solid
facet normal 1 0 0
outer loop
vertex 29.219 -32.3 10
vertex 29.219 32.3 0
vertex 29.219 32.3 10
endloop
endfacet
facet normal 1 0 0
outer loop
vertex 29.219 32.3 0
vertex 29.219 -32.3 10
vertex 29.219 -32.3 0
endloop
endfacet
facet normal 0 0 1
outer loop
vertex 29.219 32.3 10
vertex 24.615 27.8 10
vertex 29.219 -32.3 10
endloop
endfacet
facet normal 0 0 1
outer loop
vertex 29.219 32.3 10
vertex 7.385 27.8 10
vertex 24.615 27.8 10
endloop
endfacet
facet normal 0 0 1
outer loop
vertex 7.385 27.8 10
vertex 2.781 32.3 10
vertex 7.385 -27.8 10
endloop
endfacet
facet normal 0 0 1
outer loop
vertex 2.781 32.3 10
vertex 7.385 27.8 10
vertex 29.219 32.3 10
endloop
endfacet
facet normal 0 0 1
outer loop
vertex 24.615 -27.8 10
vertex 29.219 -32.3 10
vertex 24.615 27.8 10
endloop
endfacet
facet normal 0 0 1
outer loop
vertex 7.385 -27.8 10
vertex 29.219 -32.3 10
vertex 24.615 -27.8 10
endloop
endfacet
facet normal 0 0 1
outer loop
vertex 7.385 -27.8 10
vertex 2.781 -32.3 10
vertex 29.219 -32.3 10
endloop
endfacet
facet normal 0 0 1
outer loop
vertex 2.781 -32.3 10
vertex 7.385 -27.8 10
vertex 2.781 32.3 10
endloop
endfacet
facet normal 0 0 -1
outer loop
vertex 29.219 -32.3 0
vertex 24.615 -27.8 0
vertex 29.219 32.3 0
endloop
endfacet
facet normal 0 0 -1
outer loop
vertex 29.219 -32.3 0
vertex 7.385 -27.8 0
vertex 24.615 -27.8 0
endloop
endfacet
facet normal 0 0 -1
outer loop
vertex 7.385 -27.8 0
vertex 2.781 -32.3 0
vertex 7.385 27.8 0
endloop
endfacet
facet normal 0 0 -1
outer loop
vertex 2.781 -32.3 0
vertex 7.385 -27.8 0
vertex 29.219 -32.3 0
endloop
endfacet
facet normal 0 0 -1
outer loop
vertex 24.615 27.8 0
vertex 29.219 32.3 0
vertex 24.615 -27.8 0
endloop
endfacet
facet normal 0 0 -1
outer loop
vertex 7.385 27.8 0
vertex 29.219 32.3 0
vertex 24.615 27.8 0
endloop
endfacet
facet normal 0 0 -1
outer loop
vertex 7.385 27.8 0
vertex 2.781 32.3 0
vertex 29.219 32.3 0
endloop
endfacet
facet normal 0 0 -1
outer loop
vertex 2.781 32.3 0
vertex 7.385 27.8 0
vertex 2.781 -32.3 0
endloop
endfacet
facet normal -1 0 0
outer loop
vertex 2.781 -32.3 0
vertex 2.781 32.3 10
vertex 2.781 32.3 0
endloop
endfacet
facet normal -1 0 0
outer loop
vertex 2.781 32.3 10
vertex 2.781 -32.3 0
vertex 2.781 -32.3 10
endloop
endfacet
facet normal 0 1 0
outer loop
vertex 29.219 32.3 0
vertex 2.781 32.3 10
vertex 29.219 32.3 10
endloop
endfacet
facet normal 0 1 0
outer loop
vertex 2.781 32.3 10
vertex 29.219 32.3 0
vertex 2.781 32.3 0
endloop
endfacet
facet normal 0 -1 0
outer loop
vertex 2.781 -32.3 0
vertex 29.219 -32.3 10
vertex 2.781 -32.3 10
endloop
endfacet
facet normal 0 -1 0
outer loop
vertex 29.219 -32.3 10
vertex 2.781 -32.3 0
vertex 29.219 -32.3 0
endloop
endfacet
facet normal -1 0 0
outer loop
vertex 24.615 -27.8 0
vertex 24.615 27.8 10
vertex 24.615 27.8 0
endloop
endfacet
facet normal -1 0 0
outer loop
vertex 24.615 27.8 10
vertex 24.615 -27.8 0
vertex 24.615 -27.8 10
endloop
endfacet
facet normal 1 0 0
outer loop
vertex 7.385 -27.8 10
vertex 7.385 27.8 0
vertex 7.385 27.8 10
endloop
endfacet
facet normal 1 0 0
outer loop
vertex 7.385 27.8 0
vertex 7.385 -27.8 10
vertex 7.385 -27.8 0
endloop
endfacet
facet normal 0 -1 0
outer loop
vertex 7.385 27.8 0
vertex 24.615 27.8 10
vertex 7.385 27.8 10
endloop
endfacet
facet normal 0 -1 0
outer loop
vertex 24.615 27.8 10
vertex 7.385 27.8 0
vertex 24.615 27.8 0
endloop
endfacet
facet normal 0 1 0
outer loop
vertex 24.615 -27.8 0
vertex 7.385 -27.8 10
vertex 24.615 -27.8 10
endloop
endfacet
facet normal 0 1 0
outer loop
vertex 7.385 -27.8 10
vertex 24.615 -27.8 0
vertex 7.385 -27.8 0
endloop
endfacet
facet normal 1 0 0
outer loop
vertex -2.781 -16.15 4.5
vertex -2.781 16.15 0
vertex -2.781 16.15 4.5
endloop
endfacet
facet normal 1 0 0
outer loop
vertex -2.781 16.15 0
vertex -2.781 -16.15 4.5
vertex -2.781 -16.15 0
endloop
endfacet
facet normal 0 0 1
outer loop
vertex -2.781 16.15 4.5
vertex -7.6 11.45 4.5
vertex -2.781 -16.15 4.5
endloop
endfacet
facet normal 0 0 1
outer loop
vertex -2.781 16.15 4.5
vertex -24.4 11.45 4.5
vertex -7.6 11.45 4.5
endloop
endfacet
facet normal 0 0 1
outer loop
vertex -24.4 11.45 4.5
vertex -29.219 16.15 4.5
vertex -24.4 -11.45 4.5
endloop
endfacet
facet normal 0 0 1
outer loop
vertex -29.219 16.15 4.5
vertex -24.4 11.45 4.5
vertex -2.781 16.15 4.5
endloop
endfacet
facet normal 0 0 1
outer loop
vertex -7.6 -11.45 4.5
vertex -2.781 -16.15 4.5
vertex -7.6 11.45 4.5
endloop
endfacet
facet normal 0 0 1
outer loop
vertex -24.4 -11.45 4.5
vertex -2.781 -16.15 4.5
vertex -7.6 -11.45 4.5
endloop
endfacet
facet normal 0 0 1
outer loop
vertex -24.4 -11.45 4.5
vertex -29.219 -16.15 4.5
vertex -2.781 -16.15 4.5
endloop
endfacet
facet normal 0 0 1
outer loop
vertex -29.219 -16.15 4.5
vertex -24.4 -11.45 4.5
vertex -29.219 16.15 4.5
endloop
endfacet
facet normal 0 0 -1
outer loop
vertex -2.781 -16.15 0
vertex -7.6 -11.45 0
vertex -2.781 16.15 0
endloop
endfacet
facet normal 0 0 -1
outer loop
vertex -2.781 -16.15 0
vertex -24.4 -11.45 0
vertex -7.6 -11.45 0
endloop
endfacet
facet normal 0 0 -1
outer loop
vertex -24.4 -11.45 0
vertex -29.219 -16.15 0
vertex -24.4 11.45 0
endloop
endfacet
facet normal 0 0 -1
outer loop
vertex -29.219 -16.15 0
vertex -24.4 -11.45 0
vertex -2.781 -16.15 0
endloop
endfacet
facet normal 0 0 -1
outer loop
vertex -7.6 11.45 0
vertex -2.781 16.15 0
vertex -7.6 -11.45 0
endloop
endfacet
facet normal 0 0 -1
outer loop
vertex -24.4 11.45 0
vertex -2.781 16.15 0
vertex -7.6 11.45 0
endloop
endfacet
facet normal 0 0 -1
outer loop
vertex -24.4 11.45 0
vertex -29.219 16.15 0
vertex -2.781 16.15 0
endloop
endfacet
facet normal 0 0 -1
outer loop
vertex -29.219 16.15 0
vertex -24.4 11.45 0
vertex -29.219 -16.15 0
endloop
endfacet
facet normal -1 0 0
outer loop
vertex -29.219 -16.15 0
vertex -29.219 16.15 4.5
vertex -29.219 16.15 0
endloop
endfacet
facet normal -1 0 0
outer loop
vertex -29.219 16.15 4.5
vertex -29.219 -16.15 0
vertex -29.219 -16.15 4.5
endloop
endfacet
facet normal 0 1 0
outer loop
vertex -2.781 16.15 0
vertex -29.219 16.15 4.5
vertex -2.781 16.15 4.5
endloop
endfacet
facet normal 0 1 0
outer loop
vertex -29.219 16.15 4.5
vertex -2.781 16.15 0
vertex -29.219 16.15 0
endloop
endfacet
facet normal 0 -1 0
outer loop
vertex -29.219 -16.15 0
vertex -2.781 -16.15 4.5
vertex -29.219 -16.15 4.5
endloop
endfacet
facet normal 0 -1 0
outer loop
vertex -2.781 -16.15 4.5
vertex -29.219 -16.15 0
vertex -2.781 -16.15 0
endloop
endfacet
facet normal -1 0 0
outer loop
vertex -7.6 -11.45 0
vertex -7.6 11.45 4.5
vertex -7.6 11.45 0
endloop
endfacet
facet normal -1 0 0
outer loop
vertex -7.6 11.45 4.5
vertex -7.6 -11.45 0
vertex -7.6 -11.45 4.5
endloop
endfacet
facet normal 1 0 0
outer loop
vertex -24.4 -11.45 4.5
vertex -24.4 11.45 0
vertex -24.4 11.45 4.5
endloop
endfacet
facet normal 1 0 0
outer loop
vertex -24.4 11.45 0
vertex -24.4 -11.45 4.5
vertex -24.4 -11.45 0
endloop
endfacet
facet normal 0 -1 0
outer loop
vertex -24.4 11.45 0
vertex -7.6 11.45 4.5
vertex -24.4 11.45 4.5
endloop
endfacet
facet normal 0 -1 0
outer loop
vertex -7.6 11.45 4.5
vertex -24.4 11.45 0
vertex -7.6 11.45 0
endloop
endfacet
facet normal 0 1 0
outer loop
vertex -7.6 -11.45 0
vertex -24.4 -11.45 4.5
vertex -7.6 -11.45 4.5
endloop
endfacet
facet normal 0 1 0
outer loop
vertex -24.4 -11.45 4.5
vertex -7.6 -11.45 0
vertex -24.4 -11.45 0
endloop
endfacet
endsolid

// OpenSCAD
// file: Variables.scad
inToMm = 25.4; //(mm/in)
milToMm = 25.4/1000; //(mm/mil)

rackW = 447;
rackL = 146;
rackWallH = 44.5;
rackWallT = 1.75;
rackInnerW = rackW - rackWallT*2;

mountW = 17.85;
mountT = rackWallT*2;
mountHoleH = mountT;
mountHoleW = 10;
mountHoleL = 6.5;
mountHoleOffset = 31.8;

containerH = 28.5 + .5;
containerW = 64.77 + .5;
containerL = 88.66 + .5;

frameT = 1.75;

sinkinBotH = 3.4;
sinkinBotL = 38.07 + 0.5;

sinkinH = 4.5;

sideHoleH = 60;
sidePathW = 7;
outerSidePathOffset = 4.5;

housingH = containerL + sinkinBotH;
housingW = containerH + 13.21875*2;
housingL = containerW + 10*2;

ringLockT = 10; 
// main file
include <Variables.scad>

Rack();
union() {
    *Rack_Left([0, housingL/2 + 15, 0]);
    *Rack_Right([0, -housingL/2 - 15, 0]);
}
!union() {
    Ring_Lock_Top([16, 0, 0]);
    Ring_Lock_Bot([-16, 0, 0]);
}
//Ring_Lock_Top([0, 0, 80]);
//Ring_Lock_Bot([0, -containerW/4, 5]);

module Rack_Shelf(shift = [0, 0, 0], rotation = [0, 0, 0]) {
    translate(shift) { rotate(rotation) {
    
    
    solid_block([rackW, rackL, rackWallT]);
    for (i = [-1 : 2 : 1]) translate([i*(rackW-rackWallT)/2, 0]) {
        solid_block([rackWallT, rackL, rackWallH]);
    }
    
    
    }}
}

module Rack(shift = [0, 0, 0], rotation = [0, 0, 0]) {
    translate(shift) { rotate(rotation) {
    
    
    solid_block([rackW, housingL, rackWallT]);
    for (i = [-1 : 2 : 1]) translate([i*(rackW-rackWallT)/2, 0]) {
        difference() {
            solid_block([rackWallT, housingL, housingH + rackWallT]);
            translate([0, -containerW/4 + outerSidePathOffset, sinkinBotH + sinkinH + rackWallT])
                solid_block([rackWallT, containerW/2, sideHoleH]);
        }
        translate([i*(rackWallT + mountW)/2, -(housingL - mountT)/2, 0]) difference() {
            solid_block([mountW, mountT, housingH + rackWallT]);
            for (j = [0 : 2]) translate([0, 0, 6.25 + j*mountHoleOffset]) rotate([90, 0, 0]) translate([0, 0, -(mountHoleH + 0.02)/2])
                elongated_cylinder([mountHoleW, mountHoleL, mountHoleH + 0.02]);
        }
    }
    difference() {
        for (i = [0 : rackInnerW/8 : rackInnerW - rackInnerW/8]) translate([i - rackInnerW/2 + rackInnerW/16, 0, rackWallT]) {
            container_housing();
        }
        translate([0, 0, housingH + rackWallT - ringLockT]) difference() {
            solid_block([housingW - containerH + 0.001, containerW, ringLockT]);
            solid_block([housingW - containerH - ringLockT, containerW - ringLockT, ringLockT]);
        }
        translate([0, -containerW/4, sinkinBotH + rackWallT]) difference() {
            solid_block([housingW - containerH + 0.001, containerW/2, sinkinH]);
            solid_block([housingW - containerH - ringLockT, containerW/2 - ringLockT, sinkinH]);
        }
    }
    
    
    }}
}

module Rack_Left(shift = [0, 0, 0], rotation = [0, 0, 0]) {
    translate(shift) { rotate(rotation) {
    
    
    difference() {
        translate([rackW/4 + mountW/2, 0, 0]) intersection() {
            Rack();
            translate([-150, 0, 0])
                solid_block([300, housingL + 1, rackWallT + housingH + 1]);
        }
        translate([rackW/4 + mountW/2, 0, 0])
            inner_chamfering([0, housingL, 1], 1);
    }
    
    
    }}
}

module Rack_Right(shift = [0, 0, 0], rotation = [0, 0, 0]) {
    translate(shift) { rotate(rotation) {
    
    
    difference() {
        translate([-rackW/4 - mountW/2, 0, 0]) intersection() {
            Rack();
            translate([150, 0, 0])
                solid_block([300, housingL + 1, rackWallT + housingH + 1]);
        }
        translate([-rackW/4 - mountW/2, 0, 0])
            inner_chamfering([0, housingL, 1], 1);
    }
    
    
    }}
}

module Ring_Lock_Top(shift = [0, 0, 0], rotation = [0, 0, 0]) {
    translate(shift) { rotate(rotation) {
        
        
    difference() {
        solid_block([housingW - containerH, 64.6, ringLockT]);
        solid_block([17.23, 55.6, ringLockT]);
    }
        
        
    }}
}

module Ring_Lock_Bot(shift = [0, 0, 0], rotation = [0, 0, 0]) {
    translate(shift) { rotate(rotation) {
        
        
    difference() {
        solid_block([housingW - containerH, 32.3, sinkinH]);
        solid_block([16.8, 22.9, sinkinH]);
    }
        
        
    }}
}

module container_housing() {
    difference() {
        solid_block([housingW, housingL, housingH]);
        //insides
        translate([0, 0, sinkinBotH])
            container_volume();
        //bottom hole
        solid_block([containerH, sinkinBotL, sinkinBotH]);
        //back hole
        translate([0, containerW/2 + (housingL - containerW)/4, sinkinBotH + sinkinH])
            solid_block([containerH - frameT*2, (housingL - containerW)/2, containerL - sinkinH*2]);
        //side hole
        translate([0, -containerW/4, sinkinBotH + sinkinH])
            solid_block([housingW, containerW/2, sideHoleH]);
        //wire pathways
        for (i = [-1 : 2 : 1]) translate([i*(housingW - sidePathW)/2, 0, sinkinBotH + sinkinH])
            solid_block([sidePathW, containerW + (housingL - containerW), sideHoleH]);
        //occupying indicator hole
        translate([0, -(containerW/2 + (housingL - containerW)/4), (housingH - (containerH - frameT*2))/2])
            solid_block([containerH - frameT*2, (housingL - containerW)/2, containerH - frameT*2]);
    }
}

module container_volume() {
    translate([-containerH/2, 0, containerL/2]) rotate([90, 0, 90])
        solid_block([containerW, containerL, containerH]);
}

module solid_block(dimensions) {
    translate([0, 0, dimensions[2]/2])
        cube(dimensions, true);
}

module solid_block_chamfered(dimensions, chamferWidth = 0) {
    difference() {
        solid_block(dimensions);
        for (i = [0 : 1]) {
            translate([(i%2)*(dimensions[0]-chamferWidth)/2, (1-i%2)*(dimensions[1]-chamferWidth)/2, chamferWidth/2])
            rotate([-135*(1-i%2), 135*(i%2), 0])
                solid_block(
                            [(1-i%2)*dimensions[0] + (i%2)*chamferWidth*2, 
                             (i%2)*dimensions[1] + (1-i%2)*chamferWidth*2, 
                             chamferWidth]);
            translate([-(i%2)*(dimensions[0]-chamferWidth)/2, -(1-i%2)*(dimensions[1]-chamferWidth)/2, chamferWidth/2])
            rotate([135*(1-i%2), -135*(i%2), 0])
                solid_block(
                            [(1-i%2)*dimensions[0] + (i%2)*chamferWidth*2, 
                             (i%2)*dimensions[1] + (1-i%2)*chamferWidth*2, 
                             chamferWidth]);
        }
    }
}

module elongated_cylinder(dimensions) {
    radius = dimensions[1]/2;
    elongation = dimensions[0] - dimensions[2];
    for (i = [-1 : 2 : 1]) translate([i * elongation/2, 0, 0])
        cylinder(dimensions[2], radius, radius, $fn=100);
    solid_block([elongation, dimensions[1], dimensions[2]]);
}

module inner_chamfering(dimensions, chamferWidth = 0) {
    dimensions = [dimensions[0]+chamferWidth*2, dimensions[1]+chamferWidth*2, chamferWidth];
    difference() {
        solid_block(dimensions);
        for (i = [0 : 1]) {
            translate([(i%2)*(dimensions[0]-chamferWidth)/2, (1-i%2)*(dimensions[1]-chamferWidth)/2, chamferWidth/2])
            rotate([-45*(1-i%2), 45*(i%2), 0])
                solid_block(
                            [(1-i%2)*dimensions[0] + (i%2)*chamferWidth*2, 
                             (i%2)*dimensions[1] + (1-i%2)*chamferWidth*2, 
                             chamferWidth]);
            translate([-(i%2)*(dimensions[0]-chamferWidth)/2, -(1-i%2)*(dimensions[1]-chamferWidth)/2, chamferWidth/2])
            rotate([45*(1-i%2), -45*(i%2), 0])
                solid_block(
                            [(1-i%2)*dimensions[0] + (i%2)*chamferWidth*2, 
                             (i%2)*dimensions[1] + (1-i%2)*chamferWidth*2, 
                             chamferWidth]);
        }
    }
}

module _format_(shift = [0, 0, 0], rotation = [0, 0, 0]) {
    translate(shift) { rotate(rotation) {
    
    
    
    
    
    }}
}
